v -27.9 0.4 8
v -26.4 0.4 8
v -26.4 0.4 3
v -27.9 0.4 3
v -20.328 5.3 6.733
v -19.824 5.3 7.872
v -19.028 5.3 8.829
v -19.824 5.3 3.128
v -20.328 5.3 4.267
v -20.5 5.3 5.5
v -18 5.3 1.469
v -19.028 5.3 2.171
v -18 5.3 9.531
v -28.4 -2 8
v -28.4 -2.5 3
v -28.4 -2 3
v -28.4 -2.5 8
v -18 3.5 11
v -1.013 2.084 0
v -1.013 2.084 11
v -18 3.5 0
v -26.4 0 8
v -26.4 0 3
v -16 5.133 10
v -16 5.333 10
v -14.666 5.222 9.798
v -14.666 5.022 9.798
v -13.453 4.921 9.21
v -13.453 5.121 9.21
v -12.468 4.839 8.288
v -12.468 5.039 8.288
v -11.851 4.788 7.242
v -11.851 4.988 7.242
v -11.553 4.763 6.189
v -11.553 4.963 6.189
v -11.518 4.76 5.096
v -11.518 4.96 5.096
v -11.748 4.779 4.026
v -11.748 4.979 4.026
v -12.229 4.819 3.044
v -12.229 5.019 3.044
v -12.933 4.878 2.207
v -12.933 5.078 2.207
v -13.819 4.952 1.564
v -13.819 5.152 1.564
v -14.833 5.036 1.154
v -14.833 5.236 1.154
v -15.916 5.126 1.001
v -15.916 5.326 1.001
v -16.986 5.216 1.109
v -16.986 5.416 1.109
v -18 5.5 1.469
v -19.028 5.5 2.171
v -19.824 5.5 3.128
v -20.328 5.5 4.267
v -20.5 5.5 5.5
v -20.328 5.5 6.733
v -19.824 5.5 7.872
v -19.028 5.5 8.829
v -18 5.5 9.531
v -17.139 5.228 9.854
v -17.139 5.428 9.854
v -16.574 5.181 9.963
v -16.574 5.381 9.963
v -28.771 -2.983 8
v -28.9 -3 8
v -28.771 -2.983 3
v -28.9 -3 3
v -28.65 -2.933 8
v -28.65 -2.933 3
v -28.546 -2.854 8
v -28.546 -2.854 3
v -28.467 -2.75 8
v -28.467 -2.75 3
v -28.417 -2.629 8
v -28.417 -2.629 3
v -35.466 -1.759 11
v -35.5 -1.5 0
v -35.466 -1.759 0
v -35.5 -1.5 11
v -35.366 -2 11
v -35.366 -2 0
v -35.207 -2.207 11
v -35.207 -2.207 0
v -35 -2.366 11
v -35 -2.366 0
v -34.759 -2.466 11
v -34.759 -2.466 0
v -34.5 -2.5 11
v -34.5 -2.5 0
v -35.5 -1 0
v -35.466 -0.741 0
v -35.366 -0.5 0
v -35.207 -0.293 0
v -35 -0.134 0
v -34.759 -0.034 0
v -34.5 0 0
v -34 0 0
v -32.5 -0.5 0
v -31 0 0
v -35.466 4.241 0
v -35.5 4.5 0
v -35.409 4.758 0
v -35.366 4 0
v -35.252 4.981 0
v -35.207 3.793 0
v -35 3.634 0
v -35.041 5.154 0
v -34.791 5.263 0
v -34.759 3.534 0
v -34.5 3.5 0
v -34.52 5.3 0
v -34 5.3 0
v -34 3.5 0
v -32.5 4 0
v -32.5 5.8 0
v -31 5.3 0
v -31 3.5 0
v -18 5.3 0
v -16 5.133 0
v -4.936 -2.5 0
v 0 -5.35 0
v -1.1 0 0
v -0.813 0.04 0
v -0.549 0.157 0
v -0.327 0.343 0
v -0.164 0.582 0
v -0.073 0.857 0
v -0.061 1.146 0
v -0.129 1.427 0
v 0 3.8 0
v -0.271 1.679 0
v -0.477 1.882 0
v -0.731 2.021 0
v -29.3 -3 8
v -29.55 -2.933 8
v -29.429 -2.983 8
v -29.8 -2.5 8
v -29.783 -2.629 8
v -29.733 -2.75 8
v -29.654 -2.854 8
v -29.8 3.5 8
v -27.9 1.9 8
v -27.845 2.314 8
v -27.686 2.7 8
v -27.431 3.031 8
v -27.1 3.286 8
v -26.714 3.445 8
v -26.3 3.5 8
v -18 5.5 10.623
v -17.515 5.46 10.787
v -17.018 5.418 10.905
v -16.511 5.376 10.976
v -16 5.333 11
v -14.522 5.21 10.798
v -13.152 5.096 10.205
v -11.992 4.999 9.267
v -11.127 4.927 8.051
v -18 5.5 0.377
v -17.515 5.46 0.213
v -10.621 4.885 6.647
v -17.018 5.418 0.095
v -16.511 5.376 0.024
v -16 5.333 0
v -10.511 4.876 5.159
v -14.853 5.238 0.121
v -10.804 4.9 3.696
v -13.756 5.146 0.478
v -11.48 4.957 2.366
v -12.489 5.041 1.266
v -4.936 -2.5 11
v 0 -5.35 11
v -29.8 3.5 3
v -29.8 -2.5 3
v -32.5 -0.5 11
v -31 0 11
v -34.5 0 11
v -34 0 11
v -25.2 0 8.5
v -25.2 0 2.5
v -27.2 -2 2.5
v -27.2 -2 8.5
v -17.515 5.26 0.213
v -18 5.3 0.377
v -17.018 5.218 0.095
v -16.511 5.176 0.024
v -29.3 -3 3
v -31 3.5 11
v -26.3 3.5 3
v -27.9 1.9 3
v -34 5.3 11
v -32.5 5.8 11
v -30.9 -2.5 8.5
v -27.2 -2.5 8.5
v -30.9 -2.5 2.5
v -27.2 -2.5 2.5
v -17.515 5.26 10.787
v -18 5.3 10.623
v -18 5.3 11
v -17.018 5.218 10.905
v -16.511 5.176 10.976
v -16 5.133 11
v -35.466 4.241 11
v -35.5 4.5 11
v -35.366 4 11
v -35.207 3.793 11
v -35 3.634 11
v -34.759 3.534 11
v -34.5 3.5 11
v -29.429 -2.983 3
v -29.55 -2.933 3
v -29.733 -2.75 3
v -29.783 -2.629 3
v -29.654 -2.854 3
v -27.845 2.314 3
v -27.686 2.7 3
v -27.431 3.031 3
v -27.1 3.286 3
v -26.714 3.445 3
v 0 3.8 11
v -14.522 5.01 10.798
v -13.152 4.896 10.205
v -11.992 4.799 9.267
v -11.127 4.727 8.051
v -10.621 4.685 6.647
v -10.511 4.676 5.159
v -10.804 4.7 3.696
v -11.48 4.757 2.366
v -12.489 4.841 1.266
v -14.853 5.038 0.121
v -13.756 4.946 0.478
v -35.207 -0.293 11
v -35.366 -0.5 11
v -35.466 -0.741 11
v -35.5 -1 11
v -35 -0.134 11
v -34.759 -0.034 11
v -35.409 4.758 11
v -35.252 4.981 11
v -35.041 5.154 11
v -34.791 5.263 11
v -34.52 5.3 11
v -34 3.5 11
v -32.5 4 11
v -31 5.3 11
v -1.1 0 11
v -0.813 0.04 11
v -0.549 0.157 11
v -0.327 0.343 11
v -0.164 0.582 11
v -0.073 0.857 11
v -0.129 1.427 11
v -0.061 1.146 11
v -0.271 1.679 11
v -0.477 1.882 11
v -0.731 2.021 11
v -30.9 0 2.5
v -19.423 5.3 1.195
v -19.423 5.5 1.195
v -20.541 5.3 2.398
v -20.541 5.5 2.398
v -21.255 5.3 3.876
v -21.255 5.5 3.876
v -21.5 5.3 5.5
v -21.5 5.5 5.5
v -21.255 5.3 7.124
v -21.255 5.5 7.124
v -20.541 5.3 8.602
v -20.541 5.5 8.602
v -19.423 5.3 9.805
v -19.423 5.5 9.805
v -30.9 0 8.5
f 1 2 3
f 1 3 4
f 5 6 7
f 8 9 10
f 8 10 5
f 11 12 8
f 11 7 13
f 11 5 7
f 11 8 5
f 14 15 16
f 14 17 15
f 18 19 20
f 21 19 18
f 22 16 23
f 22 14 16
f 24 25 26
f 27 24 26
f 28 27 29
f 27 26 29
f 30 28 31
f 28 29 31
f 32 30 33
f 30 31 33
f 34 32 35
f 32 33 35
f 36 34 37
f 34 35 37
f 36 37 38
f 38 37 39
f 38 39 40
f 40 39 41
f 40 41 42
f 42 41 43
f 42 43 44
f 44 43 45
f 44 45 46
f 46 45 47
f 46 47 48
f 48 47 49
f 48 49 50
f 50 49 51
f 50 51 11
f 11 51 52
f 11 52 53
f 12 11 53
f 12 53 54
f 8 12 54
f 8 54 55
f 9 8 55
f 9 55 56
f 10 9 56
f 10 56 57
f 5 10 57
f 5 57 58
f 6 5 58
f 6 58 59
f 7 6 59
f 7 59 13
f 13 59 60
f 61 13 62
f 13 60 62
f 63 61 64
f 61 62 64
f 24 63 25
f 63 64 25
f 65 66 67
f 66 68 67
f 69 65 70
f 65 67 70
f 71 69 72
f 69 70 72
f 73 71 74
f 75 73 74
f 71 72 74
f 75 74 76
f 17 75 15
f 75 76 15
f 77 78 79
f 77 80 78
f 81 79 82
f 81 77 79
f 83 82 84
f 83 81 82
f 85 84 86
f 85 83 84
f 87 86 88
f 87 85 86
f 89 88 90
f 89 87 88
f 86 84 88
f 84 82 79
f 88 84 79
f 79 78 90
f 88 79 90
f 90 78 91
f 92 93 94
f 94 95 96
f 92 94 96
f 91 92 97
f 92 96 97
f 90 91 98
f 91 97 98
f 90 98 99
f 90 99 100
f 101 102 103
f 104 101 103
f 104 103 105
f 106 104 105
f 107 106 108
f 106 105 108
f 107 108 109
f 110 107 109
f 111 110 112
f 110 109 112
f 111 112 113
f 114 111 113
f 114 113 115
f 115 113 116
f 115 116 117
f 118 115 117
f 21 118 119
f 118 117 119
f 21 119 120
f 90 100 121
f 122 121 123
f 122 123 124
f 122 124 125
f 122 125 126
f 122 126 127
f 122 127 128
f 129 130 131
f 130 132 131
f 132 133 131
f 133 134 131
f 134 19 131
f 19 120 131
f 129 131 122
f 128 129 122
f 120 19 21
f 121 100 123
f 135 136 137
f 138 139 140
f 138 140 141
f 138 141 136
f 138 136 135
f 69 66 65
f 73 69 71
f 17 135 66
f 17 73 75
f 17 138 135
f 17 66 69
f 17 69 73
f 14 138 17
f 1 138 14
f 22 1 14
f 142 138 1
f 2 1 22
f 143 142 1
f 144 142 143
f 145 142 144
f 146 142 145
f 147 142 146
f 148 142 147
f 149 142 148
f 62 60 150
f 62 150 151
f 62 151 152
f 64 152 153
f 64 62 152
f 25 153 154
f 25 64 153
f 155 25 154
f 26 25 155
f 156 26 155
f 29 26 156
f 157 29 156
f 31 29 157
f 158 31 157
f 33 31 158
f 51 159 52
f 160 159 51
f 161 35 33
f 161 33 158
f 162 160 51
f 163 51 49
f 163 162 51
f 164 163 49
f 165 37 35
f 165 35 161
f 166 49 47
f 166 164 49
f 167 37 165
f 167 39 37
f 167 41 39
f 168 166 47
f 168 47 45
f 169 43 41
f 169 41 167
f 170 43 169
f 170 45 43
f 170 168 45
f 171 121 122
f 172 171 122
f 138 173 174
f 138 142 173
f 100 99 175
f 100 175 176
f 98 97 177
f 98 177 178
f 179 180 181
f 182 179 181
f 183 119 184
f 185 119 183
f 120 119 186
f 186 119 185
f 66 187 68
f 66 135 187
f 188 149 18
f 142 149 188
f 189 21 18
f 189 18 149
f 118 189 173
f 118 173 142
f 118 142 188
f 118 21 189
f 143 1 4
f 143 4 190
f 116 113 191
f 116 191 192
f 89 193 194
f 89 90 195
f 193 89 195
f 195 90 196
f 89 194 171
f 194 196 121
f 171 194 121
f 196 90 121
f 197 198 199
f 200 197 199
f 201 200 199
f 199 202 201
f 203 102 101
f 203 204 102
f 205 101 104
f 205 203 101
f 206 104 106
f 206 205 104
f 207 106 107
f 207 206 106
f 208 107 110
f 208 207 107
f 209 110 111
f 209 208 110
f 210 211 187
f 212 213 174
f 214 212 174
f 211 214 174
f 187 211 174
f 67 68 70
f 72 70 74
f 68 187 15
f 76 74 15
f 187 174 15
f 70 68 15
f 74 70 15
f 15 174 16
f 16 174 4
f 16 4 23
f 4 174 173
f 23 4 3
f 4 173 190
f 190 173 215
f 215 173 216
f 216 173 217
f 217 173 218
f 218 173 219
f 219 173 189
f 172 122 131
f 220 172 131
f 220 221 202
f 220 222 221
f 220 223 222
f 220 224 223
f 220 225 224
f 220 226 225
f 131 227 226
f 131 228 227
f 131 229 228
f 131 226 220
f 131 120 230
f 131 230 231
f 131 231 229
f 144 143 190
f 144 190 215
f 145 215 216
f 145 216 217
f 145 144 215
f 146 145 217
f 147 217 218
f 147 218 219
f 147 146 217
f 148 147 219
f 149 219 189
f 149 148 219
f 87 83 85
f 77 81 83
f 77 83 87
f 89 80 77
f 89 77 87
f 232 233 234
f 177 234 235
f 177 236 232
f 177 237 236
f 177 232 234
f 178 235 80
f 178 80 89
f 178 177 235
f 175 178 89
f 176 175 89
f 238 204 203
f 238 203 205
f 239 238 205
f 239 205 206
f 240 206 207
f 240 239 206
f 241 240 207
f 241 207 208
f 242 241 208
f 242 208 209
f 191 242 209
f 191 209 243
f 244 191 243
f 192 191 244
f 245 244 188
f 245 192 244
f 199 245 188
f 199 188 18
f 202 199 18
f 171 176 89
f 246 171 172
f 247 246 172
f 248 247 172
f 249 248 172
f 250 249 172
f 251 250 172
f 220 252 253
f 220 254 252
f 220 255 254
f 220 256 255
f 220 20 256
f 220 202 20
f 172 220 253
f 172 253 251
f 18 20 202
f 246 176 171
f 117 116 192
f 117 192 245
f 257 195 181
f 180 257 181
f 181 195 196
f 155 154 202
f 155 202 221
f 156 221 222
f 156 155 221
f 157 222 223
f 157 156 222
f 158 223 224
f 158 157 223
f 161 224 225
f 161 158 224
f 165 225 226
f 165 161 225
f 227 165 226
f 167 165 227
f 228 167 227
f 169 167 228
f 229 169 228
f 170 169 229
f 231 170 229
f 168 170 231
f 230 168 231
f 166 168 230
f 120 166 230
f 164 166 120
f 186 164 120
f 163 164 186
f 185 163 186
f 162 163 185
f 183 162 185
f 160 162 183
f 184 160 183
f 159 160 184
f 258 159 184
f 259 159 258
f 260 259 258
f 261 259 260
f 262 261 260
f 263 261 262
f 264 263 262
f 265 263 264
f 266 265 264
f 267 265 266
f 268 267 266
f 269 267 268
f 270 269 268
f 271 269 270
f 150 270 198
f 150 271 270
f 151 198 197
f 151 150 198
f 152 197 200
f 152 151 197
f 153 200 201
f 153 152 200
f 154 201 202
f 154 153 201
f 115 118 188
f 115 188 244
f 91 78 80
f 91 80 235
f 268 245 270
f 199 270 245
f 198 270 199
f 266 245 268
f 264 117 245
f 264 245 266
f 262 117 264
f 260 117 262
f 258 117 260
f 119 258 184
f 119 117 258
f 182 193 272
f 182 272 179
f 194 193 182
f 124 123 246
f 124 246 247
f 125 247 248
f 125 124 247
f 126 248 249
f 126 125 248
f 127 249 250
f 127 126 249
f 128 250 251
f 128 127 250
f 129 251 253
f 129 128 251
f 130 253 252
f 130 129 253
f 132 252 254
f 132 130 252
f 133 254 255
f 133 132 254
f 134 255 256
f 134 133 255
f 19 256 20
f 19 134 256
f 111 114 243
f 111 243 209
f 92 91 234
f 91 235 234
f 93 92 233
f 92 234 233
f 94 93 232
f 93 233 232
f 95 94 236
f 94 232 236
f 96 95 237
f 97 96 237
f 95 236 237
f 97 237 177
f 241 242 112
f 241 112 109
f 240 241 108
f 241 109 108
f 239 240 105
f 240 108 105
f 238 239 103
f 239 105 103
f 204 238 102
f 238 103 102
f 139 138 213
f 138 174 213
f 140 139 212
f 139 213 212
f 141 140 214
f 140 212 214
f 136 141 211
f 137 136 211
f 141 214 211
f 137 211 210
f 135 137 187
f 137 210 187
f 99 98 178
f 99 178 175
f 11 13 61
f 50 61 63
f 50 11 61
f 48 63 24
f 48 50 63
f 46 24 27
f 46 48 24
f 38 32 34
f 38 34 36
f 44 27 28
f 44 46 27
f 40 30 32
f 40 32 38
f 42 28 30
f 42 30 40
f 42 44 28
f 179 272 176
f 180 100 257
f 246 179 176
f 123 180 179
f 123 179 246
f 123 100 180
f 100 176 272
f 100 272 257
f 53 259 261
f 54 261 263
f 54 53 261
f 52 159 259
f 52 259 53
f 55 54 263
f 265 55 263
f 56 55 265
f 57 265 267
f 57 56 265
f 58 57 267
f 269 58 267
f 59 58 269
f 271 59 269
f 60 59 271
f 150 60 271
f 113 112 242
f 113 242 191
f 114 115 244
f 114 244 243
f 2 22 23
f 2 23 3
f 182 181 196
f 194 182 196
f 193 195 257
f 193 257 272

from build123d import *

# Parameters (mm, degrees)
BOSS_EXTRUDE1_DEPTH   = 11
BOSS_EXTRUDE1_2_DEPTH = 11
SKETCH2_W             = 5.7
SKETCH2_H             = 6
CUT_EXTRUDE1_DEPTH    = 3
BOSS_EXTRUDE8_DEPTH   = 11
BOSS_EXTRUDE2_DEPTH   = 6
BOSS_EXTRUDE3_START   = -5.5
BOSS_EXTRUDE3_DEPTH   = 2.5
FILLET7_R             = 1
FILLET8_R             = 1
FILLET10_R            = 1
FILLET11_R            = 1
FILLET12_R            = 0.5
BOSS_EXTRUDE7_REACH   = 45.115
BOSS_EXTRUDE7_START   = 5.5
SKETCH6_R             = 5.5
SKETCH6_R_2           = 4.5
CUT_EXTRUDE3_DEPTH    = 38.615023594
BOSS_EXTRUDE9_DEPTH   = 11


with BuildPart() as part:
    # Sketch1 → Boss-Extrude1 (new body)
    with BuildSketch(Plane.XY):
        Polygon((0, 3.8), (0, 2), (-18, 3.5), (-31, 3.5), (-32.5, 4), (-34, 3.5), (-35.5, 3.5), (-35.5, 5.3), (-34, 5.3), (-32.5, 5.8), (-31, 5.3), (-18, 5.3), align=None)
    extrude(amount=BOSS_EXTRUDE1_DEPTH)



with BuildPart() as body_2:
    # Sketch1 → Boss-Extrude1 2 (new body)
    with BuildSketch(Plane.XY):
        Polygon((0, 0), (0, -2.5), (-35.5, -2.5), (-35.5, 0), (-34, 0), (-32.5, -0.5), (-31, 0), align=None)
    extrude(amount=BOSS_EXTRUDE1_2_DEPTH)

    # Sketch2 → Cut-Extrude1 (cut)
    with BuildSketch(Plane.XZ.offset(2.5)):
        with Locations((-28.05, 5.5)):
            Rectangle(SKETCH2_W, SKETCH2_H)
    extrude(amount=-CUT_EXTRUDE1_DEPTH, mode=Mode.SUBTRACT)


with BuildPart() as part_1:
    add(part.part)

    add(body_2.part)  # Boss-Extrude8 merges body 2
    # Sketch8 → Boss-Extrude8 (add)
    with BuildSketch(Plane(origin=(0, 0, 0), x_dir=(-1, 0, 0), z_dir=(0, 0, -1))):
        with BuildLine():
            Line((1.013298532, 2.084441544), (0, 2))
            Line((0, 2), (0, 0))
            Line((0, 0), (1.1, 0))
            ThreePointArc((1.1, 0), (0.05687804, 1.000635709), (1.013298532, 2.084441544))
        make_face()
    extrude(amount=-BOSS_EXTRUDE8_DEPTH)

    # Sketch3 → Boss-Extrude2 (add)
    with BuildSketch(Plane.XY.offset(2.5)):
        Polygon((-25.2, 0), (-27.2, -2), (-27.2, -2.5), (-25.2, -2.5), align=None)
    extrude(amount=BOSS_EXTRUDE2_DEPTH)

    # Sketch4 → Boss-Extrude3 (add, symmetric)
    with BuildSketch(Plane.XY.offset(11).offset(BOSS_EXTRUDE3_START)):
        with BuildLine():
            Line((-28.4, -2), (-26.4, 0))
            Line((-26.4, 0), (-26.4, 0.4))
            Line((-26.4, 0.4), (-27.9, 0.4))
            Line((-27.9, 0.4), (-27.9, 1.9))
            ThreePointArc((-27.9, 1.9), (-27.43137085, 3.03137085), (-26.3, 3.5))
            Line((-26.3, 3.5), (-29.8, 3.5))
            Line((-29.8, 3.5), (-29.8, -3))
            Line((-29.8, -3), (-28.4, -3))
            Line((-28.4, -3), (-28.4, -2))
        make_face()
    extrude(amount=BOSS_EXTRUDE3_DEPTH, both=True)

    # Fillet7
    fillet7_edges = [part_1.edges().sort_by_distance(p)[0] for p in [
        (-35.5, 0, 5.5),
    ]]
    fillet(fillet7_edges, radius=FILLET7_R)

    # Fillet8
    fillet8_edges = [part_1.edges().sort_by_distance(p)[0] for p in [
        (-35.5, 3.5, 5.5),
    ]]
    fillet(fillet8_edges, radius=FILLET8_R)

    # Fillet10
    # the kernel refuses this fillet: 1 mm, written as the material it takes off along each edge
    with BuildSketch(Plane(origin=(-35.5, 5.3, -2.449489743), x_dir=(1.6076029396566988e-12, -1.0, 0), z_dir=(0, 0, 1))) as fillet10_piece_1:
        with BuildLine():
            CenterArc((1, 0.979795897), FILLET10_R, 180, 78.463040967)
            Line((0, 0.979795897), (-0.02, 0.979795897))
            Line((-0.02, 0.979795897), (-0.02, 0))
            Line((-0.02, 0), (0, -0.02))
            ThreePointArc((0, -0.02), (0.4, -0.02), (0.796, -0.019595918))
            Line((0.796, -0.019595918), (0.8, 0))
        make_face()
    extrude(amount=15.898979486, mode=Mode.SUBTRACT)

    # Fillet11
    fillet11_edges = [part_1.edges().sort_by_distance(p)[0] for p in [
        (-35.5, -2.5, 5.5),
    ]]
    fillet(fillet11_edges, radius=FILLET11_R)

    # Fillet12
    fillet12_edges = [part_1.edges().sort_by_distance(p)[0] for p in [
        (-28.4, -3, 5.5),
        (-29.8, -3, 5.5),
    ]]
    fillet(fillet12_edges, radius=FILLET12_R)

    # Sketch6 → Boss-Extrude7 (add, up to next)
    with BuildSketch(Plane(origin=(0, 0, 0), x_dir=(1, 0, 0), z_dir=(0, 1, 0)).offset(BOSS_EXTRUDE7_START), mode=Mode.PRIVATE) as boss_extrude7_sk1:
        with Locations(Location((-16, -5.5, 0), (0, 0, 270))):
            Circle(SKETCH6_R)
        with Locations(Location((-16, -5.5, 0), (0, 0, 270))):
            Circle(SKETCH6_R_2, mode=Mode.SUBTRACT)
    boss_extrude7_tool1 = extrude(boss_extrude7_sk1.sketch, amount=-BOSS_EXTRUDE7_REACH, mode=Mode.PRIVATE) - part_1.part
    add(boss_extrude7_tool1.solids().sort_by_distance((-16, 5.5, 0.155563))[0])

    # Sketch7 → Cut-Extrude3 (cut, through all)
    with BuildSketch(Plane.XY):
        Polygon((-18, 5.5), (-8, 4.666666667), (-8, 5.5), align=None)
    extrude(amount=CUT_EXTRUDE3_DEPTH, mode=Mode.SUBTRACT)

    # Sketch10 → Boss-Extrude9 (add)
    with BuildSketch(Plane(origin=(0, 0, 0), x_dir=(-1, 0, 0), z_dir=(0, 0, -1))):
        Polygon((0, -2.5), (4.936344802, -2.5), (0, -5.35), align=None)
    extrude(amount=-BOSS_EXTRUDE9_DEPTH)


solid = part_1.part
